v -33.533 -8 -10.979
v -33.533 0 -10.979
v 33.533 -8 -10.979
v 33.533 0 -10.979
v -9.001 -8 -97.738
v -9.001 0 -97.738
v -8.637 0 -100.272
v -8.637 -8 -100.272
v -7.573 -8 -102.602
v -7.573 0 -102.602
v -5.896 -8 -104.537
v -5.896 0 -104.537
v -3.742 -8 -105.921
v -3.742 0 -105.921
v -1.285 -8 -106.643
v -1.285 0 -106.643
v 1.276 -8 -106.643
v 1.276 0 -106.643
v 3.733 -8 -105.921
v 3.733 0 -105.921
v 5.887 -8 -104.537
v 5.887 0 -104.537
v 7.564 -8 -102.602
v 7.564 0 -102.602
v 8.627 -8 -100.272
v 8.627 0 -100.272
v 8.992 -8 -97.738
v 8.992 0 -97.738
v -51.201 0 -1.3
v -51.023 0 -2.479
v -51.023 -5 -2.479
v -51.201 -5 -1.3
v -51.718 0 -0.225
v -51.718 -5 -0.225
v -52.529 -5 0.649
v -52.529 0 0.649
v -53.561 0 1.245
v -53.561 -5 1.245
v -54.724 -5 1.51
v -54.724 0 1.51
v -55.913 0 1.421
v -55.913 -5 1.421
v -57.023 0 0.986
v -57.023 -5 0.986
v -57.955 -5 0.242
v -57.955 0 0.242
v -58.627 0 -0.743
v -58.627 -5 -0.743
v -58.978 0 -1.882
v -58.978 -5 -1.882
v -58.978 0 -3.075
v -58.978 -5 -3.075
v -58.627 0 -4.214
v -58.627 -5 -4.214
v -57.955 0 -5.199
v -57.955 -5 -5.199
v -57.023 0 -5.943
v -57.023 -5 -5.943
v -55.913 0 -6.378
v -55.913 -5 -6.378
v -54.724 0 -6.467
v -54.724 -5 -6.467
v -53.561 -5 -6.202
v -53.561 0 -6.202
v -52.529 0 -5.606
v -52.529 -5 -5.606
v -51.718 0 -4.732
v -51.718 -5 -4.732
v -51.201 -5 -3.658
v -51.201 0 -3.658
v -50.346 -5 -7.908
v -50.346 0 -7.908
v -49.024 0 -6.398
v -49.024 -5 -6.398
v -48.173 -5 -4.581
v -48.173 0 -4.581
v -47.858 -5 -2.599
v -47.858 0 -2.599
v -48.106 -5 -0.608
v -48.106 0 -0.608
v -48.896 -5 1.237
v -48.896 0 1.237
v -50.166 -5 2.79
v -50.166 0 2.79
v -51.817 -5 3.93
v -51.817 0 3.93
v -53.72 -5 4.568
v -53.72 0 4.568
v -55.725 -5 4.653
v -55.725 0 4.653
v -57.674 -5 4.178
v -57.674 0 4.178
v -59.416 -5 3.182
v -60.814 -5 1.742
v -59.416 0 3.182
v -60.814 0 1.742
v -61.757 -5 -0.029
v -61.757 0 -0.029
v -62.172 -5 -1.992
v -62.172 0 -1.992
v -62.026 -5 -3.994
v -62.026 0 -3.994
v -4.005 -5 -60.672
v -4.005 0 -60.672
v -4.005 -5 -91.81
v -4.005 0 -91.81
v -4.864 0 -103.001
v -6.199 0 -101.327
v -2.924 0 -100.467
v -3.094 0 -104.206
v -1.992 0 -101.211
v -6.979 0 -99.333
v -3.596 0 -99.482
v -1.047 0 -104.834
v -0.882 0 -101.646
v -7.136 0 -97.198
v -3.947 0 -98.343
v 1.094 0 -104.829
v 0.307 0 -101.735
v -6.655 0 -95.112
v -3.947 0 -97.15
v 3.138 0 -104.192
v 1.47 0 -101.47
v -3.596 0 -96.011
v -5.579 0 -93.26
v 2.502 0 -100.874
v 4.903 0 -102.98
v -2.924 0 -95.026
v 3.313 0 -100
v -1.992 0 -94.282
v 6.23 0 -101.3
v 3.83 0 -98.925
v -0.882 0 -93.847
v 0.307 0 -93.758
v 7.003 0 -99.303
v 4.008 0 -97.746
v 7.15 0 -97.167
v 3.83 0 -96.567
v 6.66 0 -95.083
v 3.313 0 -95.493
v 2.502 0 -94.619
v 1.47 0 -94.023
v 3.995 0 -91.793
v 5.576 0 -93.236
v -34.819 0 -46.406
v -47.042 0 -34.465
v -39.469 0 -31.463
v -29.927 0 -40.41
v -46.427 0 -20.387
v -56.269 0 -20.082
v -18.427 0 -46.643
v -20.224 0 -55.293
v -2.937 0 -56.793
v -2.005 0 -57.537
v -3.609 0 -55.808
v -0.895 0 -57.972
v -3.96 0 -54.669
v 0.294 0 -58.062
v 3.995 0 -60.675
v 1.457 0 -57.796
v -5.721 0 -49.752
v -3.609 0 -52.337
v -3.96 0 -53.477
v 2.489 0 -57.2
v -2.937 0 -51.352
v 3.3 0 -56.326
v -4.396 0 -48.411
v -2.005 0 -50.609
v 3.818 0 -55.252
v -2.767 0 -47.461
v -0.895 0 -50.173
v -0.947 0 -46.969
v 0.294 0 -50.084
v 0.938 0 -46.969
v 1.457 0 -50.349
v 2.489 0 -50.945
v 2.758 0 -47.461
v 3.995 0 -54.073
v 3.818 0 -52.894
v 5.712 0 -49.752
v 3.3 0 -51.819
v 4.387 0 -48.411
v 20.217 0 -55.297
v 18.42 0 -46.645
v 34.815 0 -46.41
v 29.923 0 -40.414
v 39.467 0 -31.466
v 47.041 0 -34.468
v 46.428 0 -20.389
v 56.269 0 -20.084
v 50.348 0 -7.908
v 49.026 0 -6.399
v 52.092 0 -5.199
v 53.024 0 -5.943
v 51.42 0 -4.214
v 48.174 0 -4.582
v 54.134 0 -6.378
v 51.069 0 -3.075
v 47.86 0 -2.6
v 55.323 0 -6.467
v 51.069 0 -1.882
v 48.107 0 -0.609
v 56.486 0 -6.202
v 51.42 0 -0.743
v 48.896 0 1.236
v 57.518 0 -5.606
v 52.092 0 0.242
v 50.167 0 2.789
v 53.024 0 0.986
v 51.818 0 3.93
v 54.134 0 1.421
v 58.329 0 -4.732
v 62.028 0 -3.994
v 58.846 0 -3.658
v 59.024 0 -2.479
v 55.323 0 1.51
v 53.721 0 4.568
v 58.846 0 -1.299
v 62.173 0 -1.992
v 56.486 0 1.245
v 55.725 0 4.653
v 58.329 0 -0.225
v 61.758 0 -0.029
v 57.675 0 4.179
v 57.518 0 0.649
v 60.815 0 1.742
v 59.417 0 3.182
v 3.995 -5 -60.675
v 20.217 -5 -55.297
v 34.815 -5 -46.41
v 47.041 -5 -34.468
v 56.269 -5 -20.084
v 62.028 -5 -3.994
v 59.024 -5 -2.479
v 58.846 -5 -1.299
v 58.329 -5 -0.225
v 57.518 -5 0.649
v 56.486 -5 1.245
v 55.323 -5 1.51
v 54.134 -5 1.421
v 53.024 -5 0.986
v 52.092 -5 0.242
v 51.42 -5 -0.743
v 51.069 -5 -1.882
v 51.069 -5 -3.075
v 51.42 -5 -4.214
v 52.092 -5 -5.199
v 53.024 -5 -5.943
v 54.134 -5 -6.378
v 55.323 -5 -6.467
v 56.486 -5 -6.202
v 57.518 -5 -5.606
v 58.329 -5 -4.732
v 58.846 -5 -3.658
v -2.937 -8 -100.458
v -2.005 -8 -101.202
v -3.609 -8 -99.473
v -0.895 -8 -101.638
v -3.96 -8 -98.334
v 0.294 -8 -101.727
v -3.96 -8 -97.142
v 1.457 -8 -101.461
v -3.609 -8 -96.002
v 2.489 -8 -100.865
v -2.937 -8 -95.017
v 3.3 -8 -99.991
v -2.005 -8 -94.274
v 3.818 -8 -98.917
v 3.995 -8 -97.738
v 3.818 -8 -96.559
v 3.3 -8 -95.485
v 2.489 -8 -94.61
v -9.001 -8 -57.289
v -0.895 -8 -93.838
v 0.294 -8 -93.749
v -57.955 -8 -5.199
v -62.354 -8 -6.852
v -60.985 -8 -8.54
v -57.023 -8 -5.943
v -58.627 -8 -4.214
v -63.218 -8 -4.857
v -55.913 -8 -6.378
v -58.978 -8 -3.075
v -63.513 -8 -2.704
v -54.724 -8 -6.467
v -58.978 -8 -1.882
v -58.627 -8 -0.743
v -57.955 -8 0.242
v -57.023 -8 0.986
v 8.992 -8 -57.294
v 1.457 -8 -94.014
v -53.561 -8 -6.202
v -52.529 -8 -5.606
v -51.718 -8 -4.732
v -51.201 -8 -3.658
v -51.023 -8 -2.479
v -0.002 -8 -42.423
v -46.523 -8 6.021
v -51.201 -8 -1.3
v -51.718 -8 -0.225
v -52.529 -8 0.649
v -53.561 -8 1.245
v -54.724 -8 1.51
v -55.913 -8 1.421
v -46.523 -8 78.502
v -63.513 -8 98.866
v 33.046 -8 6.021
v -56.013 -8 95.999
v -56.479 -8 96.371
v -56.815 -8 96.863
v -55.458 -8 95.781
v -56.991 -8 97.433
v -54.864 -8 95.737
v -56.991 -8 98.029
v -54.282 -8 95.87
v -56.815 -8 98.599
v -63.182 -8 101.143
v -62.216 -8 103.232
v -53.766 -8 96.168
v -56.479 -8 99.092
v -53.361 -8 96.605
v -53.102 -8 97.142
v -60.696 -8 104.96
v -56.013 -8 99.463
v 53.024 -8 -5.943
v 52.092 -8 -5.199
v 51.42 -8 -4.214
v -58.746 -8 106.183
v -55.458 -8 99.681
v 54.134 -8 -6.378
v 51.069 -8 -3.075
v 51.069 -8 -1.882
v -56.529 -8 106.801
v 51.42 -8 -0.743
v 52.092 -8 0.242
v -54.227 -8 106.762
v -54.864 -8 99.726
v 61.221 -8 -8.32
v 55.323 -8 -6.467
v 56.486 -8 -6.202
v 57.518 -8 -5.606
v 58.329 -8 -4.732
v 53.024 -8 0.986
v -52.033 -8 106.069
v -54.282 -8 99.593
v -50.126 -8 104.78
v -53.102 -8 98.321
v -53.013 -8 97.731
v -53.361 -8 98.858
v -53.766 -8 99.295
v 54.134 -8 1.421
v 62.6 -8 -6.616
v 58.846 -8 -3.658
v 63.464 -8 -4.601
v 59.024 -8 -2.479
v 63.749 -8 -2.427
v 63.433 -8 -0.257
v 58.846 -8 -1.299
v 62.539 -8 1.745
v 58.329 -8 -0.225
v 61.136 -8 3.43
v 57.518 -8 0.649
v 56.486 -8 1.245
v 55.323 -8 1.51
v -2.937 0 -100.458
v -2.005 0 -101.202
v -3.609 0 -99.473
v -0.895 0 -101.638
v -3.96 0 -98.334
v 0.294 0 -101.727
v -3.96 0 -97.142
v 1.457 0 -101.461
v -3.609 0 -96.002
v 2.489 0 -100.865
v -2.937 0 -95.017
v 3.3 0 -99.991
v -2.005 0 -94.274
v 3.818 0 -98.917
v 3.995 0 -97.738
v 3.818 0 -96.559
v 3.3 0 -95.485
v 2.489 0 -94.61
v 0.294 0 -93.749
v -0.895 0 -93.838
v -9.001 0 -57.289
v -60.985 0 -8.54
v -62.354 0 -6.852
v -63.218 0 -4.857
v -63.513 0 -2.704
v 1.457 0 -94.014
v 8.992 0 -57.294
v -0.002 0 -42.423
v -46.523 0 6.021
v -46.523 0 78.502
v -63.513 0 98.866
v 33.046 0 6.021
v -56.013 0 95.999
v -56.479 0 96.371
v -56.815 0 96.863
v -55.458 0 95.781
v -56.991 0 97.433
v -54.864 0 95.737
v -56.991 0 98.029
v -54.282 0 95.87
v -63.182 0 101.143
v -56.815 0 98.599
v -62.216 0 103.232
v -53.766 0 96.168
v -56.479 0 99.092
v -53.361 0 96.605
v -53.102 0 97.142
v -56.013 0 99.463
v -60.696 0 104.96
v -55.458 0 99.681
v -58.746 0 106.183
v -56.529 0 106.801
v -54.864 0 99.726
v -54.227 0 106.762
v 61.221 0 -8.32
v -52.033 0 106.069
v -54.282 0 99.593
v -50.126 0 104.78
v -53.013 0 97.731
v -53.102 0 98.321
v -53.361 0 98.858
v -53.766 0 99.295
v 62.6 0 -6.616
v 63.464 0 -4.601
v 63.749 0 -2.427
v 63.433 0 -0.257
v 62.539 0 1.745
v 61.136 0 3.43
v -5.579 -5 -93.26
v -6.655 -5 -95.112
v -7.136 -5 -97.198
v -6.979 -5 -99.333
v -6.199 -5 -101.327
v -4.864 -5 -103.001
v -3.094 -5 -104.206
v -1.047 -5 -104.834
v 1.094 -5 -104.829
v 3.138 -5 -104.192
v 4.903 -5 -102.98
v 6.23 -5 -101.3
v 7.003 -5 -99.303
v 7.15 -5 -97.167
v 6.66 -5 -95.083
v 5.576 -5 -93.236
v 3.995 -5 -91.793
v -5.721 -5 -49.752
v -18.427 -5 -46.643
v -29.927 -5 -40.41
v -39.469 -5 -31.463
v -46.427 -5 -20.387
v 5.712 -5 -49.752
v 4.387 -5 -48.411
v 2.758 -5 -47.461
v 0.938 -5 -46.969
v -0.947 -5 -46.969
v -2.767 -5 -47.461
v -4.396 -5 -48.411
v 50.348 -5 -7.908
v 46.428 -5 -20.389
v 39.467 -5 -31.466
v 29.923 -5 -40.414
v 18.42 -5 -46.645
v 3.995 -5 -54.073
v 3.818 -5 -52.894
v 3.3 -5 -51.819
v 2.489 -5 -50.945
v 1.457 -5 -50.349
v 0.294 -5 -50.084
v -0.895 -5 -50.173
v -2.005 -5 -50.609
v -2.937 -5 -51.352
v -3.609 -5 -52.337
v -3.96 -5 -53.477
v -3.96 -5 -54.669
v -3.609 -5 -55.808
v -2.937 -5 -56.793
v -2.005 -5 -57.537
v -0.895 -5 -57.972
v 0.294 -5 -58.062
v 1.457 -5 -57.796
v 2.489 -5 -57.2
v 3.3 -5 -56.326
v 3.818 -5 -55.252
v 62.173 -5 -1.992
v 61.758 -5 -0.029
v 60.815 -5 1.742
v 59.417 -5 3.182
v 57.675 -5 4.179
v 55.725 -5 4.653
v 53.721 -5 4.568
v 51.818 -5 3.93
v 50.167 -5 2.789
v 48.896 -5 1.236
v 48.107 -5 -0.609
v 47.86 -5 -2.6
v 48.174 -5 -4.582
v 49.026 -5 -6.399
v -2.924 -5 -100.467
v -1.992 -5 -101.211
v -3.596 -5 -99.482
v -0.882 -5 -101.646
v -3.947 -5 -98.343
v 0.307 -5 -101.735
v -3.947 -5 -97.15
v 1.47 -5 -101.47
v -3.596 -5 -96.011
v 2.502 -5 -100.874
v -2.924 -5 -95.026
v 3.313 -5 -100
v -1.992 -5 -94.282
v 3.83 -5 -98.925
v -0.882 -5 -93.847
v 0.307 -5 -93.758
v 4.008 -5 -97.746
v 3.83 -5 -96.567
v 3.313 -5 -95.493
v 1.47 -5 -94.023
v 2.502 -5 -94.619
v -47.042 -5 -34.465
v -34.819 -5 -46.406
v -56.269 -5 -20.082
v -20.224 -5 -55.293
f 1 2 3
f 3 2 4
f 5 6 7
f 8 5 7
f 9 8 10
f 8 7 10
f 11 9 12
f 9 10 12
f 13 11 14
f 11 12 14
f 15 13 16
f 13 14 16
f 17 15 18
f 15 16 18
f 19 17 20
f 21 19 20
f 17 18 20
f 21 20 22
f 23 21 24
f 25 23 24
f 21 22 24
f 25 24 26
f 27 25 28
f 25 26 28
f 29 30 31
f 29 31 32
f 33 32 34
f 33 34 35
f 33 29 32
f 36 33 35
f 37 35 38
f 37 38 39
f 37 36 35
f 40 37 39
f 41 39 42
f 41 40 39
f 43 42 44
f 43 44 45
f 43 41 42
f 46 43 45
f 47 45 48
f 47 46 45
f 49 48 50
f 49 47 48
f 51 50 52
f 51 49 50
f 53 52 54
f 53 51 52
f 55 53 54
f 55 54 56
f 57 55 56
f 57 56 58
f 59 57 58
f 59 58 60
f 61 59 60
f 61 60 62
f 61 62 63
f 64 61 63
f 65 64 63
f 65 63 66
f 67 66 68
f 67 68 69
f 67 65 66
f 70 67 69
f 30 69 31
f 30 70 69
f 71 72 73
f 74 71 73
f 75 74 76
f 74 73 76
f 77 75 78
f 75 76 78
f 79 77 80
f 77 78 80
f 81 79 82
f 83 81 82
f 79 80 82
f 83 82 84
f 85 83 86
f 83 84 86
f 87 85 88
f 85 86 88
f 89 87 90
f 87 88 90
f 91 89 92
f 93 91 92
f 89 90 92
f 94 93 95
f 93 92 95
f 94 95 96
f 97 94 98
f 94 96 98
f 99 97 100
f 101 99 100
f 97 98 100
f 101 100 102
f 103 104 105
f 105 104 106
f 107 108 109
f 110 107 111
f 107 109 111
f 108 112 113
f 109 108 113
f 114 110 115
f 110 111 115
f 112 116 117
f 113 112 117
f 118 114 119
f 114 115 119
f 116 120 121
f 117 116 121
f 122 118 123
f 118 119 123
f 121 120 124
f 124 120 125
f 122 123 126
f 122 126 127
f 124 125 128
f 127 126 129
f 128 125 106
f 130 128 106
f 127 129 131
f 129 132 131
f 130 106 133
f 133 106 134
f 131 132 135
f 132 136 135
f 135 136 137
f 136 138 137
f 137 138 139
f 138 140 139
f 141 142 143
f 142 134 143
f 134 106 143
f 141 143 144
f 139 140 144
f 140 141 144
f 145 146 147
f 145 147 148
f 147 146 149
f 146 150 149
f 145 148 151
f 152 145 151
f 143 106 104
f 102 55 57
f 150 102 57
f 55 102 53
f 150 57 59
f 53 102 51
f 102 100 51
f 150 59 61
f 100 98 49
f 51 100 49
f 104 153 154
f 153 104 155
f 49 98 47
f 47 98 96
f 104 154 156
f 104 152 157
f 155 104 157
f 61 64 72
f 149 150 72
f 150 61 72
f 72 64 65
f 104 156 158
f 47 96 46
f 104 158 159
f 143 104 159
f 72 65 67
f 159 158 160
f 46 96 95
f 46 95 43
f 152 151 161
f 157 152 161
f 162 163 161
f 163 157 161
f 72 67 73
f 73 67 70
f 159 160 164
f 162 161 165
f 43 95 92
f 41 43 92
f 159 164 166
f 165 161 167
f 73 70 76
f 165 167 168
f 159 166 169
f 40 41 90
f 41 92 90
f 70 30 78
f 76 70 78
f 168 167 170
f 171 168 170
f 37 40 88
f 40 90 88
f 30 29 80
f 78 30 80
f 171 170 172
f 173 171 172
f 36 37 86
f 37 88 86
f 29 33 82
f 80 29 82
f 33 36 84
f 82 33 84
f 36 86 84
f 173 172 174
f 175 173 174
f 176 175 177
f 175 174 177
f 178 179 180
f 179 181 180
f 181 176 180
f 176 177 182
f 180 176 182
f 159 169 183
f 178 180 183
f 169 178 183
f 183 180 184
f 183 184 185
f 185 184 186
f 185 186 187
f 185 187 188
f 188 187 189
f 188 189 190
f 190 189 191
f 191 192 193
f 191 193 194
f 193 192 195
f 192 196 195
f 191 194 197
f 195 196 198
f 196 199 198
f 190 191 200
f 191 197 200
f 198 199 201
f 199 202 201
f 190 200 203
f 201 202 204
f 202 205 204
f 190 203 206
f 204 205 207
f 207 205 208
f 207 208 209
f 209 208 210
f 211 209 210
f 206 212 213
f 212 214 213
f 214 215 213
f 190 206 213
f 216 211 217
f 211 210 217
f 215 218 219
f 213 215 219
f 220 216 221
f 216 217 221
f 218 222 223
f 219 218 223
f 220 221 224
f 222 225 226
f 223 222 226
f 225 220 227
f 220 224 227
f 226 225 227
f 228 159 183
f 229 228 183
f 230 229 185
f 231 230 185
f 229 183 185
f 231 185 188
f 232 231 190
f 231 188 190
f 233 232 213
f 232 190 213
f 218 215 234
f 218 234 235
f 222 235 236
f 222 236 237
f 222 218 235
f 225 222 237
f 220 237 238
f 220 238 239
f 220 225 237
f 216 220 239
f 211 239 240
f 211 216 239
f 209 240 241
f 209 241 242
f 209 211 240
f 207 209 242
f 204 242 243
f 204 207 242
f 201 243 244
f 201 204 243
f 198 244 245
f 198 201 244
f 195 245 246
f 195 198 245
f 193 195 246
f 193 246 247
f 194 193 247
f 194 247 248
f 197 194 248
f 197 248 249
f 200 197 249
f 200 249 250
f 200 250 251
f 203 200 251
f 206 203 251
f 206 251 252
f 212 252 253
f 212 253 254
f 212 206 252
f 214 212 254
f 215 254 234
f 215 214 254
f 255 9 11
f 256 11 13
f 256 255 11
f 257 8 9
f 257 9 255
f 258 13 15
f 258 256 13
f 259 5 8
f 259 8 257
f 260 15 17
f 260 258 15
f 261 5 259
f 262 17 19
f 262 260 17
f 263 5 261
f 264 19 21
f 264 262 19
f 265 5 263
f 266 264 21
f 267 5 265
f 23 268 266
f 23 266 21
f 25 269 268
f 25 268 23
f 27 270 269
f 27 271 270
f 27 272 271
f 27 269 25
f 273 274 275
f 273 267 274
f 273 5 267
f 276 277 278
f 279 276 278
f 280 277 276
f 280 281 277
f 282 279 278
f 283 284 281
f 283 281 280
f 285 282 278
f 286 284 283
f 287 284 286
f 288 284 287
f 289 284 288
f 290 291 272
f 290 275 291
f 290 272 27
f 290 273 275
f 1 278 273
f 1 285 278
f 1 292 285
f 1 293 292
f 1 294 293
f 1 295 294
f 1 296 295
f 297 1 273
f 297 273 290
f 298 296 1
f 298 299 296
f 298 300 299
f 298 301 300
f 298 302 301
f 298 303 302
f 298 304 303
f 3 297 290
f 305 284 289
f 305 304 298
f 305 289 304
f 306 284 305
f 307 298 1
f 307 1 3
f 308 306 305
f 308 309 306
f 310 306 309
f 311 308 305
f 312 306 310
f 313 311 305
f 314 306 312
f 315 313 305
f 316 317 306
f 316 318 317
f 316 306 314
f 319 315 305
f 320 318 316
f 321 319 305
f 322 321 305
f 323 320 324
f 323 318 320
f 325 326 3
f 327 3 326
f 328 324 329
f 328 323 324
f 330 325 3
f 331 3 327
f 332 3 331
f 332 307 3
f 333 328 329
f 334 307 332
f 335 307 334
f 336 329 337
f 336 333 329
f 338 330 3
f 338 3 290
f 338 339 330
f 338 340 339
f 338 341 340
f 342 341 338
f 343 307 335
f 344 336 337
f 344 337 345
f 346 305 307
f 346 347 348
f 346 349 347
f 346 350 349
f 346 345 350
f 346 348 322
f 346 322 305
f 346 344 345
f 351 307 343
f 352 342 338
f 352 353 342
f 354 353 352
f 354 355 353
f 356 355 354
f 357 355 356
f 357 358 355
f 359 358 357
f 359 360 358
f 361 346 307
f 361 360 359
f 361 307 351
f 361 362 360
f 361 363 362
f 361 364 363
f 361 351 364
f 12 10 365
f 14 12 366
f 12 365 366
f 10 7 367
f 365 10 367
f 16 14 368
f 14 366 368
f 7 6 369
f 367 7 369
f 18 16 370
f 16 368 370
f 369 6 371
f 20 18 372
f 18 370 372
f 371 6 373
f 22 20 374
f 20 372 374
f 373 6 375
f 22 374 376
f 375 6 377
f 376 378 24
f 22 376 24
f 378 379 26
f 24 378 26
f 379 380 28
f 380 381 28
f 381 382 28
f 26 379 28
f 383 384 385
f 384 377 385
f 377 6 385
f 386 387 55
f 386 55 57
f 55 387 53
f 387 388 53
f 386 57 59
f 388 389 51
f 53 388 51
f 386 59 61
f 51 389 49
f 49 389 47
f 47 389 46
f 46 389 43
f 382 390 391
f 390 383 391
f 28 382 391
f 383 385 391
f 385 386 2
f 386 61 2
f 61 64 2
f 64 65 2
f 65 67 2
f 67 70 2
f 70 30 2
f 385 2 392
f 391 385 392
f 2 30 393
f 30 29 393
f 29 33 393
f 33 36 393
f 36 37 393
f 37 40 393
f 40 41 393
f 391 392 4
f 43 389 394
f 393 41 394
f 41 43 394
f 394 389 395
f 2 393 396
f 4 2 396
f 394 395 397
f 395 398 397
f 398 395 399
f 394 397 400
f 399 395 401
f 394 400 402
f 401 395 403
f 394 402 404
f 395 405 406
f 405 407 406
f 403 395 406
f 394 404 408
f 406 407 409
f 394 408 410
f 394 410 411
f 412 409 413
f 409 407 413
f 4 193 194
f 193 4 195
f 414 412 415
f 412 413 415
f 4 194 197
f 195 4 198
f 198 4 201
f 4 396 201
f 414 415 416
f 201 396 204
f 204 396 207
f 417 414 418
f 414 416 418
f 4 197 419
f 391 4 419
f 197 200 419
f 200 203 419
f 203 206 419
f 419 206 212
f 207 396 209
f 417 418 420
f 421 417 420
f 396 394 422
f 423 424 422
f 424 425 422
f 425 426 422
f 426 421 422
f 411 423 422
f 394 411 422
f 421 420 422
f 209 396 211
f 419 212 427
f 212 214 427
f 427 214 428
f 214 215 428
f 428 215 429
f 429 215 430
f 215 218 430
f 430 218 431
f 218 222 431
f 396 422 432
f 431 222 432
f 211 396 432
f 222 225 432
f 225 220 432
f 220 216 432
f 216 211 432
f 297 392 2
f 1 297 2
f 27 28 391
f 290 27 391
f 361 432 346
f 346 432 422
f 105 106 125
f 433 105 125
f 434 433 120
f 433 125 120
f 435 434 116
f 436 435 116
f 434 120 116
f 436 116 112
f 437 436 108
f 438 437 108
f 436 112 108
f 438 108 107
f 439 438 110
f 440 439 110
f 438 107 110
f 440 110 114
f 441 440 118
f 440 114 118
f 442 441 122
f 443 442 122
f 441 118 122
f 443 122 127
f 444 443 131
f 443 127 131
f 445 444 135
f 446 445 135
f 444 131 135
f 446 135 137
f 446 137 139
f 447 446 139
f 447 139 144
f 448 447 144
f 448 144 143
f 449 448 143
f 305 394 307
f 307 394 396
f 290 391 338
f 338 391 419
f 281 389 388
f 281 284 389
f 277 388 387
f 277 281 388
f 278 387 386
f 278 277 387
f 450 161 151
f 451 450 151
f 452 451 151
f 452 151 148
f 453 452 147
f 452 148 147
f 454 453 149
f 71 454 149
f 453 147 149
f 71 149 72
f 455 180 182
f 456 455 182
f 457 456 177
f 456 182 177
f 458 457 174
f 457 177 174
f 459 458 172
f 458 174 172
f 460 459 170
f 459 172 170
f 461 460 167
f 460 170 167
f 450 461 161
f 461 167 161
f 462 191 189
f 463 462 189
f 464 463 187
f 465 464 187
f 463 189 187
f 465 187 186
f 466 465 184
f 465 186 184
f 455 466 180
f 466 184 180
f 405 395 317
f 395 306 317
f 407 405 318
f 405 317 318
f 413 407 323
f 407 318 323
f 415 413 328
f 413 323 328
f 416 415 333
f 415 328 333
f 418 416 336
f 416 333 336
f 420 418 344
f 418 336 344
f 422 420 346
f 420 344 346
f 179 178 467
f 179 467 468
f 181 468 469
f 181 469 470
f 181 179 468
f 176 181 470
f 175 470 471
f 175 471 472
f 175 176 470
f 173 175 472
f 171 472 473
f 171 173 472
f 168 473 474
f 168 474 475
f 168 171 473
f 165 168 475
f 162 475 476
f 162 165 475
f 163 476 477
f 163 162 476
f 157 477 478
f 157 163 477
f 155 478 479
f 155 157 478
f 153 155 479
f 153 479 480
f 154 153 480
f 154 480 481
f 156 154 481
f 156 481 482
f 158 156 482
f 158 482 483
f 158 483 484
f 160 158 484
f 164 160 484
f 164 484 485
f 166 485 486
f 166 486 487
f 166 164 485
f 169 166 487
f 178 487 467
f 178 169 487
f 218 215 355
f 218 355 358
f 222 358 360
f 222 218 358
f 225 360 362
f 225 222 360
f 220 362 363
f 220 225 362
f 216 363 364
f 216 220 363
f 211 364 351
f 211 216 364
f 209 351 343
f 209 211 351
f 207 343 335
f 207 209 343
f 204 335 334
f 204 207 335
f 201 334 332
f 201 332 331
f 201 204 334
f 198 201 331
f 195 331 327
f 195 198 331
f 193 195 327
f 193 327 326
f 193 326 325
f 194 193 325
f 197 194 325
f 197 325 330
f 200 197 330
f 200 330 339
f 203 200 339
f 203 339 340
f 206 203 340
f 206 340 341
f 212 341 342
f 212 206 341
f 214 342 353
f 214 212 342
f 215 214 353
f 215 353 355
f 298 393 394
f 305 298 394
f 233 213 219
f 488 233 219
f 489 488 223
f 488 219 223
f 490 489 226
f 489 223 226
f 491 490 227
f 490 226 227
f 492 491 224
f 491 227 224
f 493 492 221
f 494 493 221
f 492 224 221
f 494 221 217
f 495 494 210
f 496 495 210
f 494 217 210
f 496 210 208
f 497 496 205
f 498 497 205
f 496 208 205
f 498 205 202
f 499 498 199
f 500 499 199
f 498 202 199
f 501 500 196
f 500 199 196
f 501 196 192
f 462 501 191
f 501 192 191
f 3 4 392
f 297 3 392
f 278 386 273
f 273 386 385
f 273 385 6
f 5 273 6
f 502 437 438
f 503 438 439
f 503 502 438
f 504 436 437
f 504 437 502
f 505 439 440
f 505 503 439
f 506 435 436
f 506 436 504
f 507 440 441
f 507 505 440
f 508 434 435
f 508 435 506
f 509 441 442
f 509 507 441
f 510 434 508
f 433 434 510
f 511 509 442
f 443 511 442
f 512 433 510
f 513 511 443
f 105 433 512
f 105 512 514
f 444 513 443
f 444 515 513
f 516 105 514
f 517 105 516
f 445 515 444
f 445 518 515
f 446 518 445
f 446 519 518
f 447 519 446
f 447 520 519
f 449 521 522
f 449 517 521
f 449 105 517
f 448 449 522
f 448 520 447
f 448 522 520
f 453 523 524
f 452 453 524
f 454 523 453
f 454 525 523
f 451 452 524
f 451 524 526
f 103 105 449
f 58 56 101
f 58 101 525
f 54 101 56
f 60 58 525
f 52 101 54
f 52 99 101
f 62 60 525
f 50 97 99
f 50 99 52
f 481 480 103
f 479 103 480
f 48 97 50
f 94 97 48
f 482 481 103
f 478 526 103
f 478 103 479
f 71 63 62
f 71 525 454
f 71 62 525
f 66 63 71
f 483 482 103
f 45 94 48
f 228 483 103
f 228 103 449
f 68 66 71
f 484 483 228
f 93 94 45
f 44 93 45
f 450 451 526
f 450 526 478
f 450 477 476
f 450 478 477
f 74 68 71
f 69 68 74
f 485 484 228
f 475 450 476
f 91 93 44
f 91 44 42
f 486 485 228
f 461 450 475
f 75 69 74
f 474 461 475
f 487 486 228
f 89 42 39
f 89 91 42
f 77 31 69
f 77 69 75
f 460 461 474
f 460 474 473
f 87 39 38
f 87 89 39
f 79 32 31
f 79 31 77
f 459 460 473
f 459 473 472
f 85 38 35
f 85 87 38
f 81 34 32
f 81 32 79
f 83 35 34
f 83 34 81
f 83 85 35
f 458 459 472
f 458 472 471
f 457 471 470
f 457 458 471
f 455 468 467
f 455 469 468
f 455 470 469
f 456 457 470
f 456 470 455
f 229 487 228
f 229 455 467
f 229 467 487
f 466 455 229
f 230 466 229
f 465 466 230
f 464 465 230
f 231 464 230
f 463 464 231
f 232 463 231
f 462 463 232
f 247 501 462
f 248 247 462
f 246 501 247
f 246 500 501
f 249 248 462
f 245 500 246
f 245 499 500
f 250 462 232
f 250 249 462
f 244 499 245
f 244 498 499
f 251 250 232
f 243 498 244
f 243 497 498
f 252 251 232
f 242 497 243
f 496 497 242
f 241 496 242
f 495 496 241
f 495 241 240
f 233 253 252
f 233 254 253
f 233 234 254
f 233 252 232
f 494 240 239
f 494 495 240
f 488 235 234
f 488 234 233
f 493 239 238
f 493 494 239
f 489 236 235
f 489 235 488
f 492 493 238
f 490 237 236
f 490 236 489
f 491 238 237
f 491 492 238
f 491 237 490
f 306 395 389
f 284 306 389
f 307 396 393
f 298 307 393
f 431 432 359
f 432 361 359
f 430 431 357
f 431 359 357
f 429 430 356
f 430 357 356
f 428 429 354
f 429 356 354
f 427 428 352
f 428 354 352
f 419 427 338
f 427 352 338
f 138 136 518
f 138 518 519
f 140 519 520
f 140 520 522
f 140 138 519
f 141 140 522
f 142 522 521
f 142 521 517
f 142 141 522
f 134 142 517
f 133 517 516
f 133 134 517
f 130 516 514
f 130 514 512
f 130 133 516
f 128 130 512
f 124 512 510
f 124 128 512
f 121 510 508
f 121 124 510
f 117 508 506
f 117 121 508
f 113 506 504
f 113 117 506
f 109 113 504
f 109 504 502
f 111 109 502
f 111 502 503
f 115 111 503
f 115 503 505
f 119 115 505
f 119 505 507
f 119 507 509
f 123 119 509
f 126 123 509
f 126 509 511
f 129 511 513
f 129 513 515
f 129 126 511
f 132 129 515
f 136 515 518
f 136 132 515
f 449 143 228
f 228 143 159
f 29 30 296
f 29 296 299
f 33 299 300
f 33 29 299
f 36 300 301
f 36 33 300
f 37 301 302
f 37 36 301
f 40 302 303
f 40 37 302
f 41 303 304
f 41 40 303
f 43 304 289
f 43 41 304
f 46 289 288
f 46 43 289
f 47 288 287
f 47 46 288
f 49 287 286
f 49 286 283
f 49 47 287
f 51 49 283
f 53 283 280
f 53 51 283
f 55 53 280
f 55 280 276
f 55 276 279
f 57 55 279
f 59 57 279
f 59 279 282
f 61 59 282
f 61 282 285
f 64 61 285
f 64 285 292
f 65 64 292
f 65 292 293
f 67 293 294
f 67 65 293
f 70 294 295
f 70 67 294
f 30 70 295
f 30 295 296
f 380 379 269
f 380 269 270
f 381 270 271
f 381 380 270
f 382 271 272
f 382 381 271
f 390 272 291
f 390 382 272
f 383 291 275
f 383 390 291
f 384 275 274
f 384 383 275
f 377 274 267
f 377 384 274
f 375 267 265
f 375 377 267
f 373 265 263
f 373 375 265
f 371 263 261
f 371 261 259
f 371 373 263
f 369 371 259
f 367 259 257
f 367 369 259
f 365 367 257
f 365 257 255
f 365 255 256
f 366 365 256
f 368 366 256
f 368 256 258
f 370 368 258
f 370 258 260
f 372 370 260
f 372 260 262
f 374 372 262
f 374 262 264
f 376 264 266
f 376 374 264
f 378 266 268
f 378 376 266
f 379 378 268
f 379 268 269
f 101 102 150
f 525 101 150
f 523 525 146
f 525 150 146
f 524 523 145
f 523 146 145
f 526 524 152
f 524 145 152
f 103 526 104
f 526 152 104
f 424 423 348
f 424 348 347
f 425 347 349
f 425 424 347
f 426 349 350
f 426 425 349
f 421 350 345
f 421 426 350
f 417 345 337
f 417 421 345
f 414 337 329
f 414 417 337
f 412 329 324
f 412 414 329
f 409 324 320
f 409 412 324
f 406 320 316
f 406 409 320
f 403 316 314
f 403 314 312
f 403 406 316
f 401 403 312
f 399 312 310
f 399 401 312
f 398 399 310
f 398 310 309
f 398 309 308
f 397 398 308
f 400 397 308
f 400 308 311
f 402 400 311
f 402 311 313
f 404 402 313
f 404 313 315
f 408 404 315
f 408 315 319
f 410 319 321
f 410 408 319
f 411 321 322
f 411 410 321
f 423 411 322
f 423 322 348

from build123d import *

# Parameters (mm, degrees)
F0_R     = 4
F0_R_2   = 2
F1_DEPTH = 8
F2_R     = 8
F3_R     = 4
F4_DEPTH = 5


with BuildPart() as f1:
    # F0 (on Front) → F1 (new body)
    with BuildSketch(Plane.XZ):
        Polygon((-63.513127, 116.974374), (-63.513127, -6.169423), (-9.001134, -57.288919), (-0.002161, -65.72785), (8.991746, -57.294443), (67.535254, -2.399359), align=None)
        with Locations((-55.022863, -2.478537)):
            Circle(F0_R, mode=Mode.SUBTRACT)
        Polygon((-0.001628, -42.422813), (-33.532704, -10.978509), (33.532521, -10.978509), align=None, mode=Mode.SUBTRACT)
        with Locations((55.024146, -2.478509)):
            Circle(F0_R, mode=Mode.SUBTRACT)
        Polygon((33.046239, 6.021463), (-46.522863, 6.021463), (-46.522863, 78.502029), align=None, mode=Mode.SUBTRACT)
        with Locations((-55.013128, 97.731264)):
            Circle(F0_R_2, mode=Mode.SUBTRACT)
        with BuildLine():
            Line((-0.002161, -65.72785), (-9.001134, -57.288919))
            Line((-9.001134, -57.288919), (-9.001134, -97.737807))
            ThreePointArc((-9.001134, -97.737807), (-0.004694, -106.734248), (8.991746, -97.737807))
            Line((8.991746, -97.737807), (8.991746, -57.294443))
            Line((8.991746, -57.294443), (-0.002161, -65.72785))
        make_face()
        with Locations((-0.004694, -97.737807)):
            Circle(F0_R, mode=Mode.SUBTRACT)
    extrude(amount=F1_DEPTH)

    # F2
    f2_edges = [f1.edges().sort_by_distance(p)[0] for p in [
        (-63.513127, -4, -6.169423),
        (67.535254, -4, -2.399359),
        (-63.513127, -4, 116.974374),
    ]]
    fillet(f2_edges, radius=F2_R)


with BuildPart() as f4:
    # F3 (on Front) → F4 (new body)
    with BuildSketch(Plane.XZ):
        with BuildLine():
            Line((-4.004653, -60.672401), (-4.004653, -91.809885))
            ThreePointArc((-4.004653, -91.809885), (0.023662, -104.911974), (3.995347, -91.792607))
            Line((3.995347, -91.792607), (3.995347, -60.674586))
            ThreePointArc((3.995347, -60.674586), (41.266643, -40.785941), (62.027773, -3.993509))
            ThreePointArc((62.027773, -3.993509), (52.74676, 4.315572), (50.348465, -7.908429))
            ThreePointArc((50.348465, -7.908429), (34.982469, -36.246654), (5.711782, -49.75205))
            ThreePointArc((5.711782, -49.75205), (-0.004648, -46.907136), (-5.721078, -49.75205))
            ThreePointArc((-5.721078, -49.75205), (-34.985059, -36.243224), (-50.346346, -7.907737))
            ThreePointArc((-50.346346, -7.907737), (-52.746001, 4.31572), (-62.026491, -3.993537))
            ThreePointArc((-62.026491, -3.993537), (-41.269232, -40.782195), (-4.004653, -60.672401))
        make_face()
        with Locations((-0.004648, -54.07275)):
            Circle(F3_R, mode=Mode.SUBTRACT)
        with Locations((0.008187, -97.746423)):
            Circle(F3_R, mode=Mode.SUBTRACT)
        with Locations((-55.022863, -2.478537)):
            Circle(F3_R, mode=Mode.SUBTRACT)
        with Locations((55.024146, -2.478509)):
            Circle(F3_R, mode=Mode.SUBTRACT)
    extrude(amount=F4_DEPTH)


solid = Compound([f1.part, f4.part])
